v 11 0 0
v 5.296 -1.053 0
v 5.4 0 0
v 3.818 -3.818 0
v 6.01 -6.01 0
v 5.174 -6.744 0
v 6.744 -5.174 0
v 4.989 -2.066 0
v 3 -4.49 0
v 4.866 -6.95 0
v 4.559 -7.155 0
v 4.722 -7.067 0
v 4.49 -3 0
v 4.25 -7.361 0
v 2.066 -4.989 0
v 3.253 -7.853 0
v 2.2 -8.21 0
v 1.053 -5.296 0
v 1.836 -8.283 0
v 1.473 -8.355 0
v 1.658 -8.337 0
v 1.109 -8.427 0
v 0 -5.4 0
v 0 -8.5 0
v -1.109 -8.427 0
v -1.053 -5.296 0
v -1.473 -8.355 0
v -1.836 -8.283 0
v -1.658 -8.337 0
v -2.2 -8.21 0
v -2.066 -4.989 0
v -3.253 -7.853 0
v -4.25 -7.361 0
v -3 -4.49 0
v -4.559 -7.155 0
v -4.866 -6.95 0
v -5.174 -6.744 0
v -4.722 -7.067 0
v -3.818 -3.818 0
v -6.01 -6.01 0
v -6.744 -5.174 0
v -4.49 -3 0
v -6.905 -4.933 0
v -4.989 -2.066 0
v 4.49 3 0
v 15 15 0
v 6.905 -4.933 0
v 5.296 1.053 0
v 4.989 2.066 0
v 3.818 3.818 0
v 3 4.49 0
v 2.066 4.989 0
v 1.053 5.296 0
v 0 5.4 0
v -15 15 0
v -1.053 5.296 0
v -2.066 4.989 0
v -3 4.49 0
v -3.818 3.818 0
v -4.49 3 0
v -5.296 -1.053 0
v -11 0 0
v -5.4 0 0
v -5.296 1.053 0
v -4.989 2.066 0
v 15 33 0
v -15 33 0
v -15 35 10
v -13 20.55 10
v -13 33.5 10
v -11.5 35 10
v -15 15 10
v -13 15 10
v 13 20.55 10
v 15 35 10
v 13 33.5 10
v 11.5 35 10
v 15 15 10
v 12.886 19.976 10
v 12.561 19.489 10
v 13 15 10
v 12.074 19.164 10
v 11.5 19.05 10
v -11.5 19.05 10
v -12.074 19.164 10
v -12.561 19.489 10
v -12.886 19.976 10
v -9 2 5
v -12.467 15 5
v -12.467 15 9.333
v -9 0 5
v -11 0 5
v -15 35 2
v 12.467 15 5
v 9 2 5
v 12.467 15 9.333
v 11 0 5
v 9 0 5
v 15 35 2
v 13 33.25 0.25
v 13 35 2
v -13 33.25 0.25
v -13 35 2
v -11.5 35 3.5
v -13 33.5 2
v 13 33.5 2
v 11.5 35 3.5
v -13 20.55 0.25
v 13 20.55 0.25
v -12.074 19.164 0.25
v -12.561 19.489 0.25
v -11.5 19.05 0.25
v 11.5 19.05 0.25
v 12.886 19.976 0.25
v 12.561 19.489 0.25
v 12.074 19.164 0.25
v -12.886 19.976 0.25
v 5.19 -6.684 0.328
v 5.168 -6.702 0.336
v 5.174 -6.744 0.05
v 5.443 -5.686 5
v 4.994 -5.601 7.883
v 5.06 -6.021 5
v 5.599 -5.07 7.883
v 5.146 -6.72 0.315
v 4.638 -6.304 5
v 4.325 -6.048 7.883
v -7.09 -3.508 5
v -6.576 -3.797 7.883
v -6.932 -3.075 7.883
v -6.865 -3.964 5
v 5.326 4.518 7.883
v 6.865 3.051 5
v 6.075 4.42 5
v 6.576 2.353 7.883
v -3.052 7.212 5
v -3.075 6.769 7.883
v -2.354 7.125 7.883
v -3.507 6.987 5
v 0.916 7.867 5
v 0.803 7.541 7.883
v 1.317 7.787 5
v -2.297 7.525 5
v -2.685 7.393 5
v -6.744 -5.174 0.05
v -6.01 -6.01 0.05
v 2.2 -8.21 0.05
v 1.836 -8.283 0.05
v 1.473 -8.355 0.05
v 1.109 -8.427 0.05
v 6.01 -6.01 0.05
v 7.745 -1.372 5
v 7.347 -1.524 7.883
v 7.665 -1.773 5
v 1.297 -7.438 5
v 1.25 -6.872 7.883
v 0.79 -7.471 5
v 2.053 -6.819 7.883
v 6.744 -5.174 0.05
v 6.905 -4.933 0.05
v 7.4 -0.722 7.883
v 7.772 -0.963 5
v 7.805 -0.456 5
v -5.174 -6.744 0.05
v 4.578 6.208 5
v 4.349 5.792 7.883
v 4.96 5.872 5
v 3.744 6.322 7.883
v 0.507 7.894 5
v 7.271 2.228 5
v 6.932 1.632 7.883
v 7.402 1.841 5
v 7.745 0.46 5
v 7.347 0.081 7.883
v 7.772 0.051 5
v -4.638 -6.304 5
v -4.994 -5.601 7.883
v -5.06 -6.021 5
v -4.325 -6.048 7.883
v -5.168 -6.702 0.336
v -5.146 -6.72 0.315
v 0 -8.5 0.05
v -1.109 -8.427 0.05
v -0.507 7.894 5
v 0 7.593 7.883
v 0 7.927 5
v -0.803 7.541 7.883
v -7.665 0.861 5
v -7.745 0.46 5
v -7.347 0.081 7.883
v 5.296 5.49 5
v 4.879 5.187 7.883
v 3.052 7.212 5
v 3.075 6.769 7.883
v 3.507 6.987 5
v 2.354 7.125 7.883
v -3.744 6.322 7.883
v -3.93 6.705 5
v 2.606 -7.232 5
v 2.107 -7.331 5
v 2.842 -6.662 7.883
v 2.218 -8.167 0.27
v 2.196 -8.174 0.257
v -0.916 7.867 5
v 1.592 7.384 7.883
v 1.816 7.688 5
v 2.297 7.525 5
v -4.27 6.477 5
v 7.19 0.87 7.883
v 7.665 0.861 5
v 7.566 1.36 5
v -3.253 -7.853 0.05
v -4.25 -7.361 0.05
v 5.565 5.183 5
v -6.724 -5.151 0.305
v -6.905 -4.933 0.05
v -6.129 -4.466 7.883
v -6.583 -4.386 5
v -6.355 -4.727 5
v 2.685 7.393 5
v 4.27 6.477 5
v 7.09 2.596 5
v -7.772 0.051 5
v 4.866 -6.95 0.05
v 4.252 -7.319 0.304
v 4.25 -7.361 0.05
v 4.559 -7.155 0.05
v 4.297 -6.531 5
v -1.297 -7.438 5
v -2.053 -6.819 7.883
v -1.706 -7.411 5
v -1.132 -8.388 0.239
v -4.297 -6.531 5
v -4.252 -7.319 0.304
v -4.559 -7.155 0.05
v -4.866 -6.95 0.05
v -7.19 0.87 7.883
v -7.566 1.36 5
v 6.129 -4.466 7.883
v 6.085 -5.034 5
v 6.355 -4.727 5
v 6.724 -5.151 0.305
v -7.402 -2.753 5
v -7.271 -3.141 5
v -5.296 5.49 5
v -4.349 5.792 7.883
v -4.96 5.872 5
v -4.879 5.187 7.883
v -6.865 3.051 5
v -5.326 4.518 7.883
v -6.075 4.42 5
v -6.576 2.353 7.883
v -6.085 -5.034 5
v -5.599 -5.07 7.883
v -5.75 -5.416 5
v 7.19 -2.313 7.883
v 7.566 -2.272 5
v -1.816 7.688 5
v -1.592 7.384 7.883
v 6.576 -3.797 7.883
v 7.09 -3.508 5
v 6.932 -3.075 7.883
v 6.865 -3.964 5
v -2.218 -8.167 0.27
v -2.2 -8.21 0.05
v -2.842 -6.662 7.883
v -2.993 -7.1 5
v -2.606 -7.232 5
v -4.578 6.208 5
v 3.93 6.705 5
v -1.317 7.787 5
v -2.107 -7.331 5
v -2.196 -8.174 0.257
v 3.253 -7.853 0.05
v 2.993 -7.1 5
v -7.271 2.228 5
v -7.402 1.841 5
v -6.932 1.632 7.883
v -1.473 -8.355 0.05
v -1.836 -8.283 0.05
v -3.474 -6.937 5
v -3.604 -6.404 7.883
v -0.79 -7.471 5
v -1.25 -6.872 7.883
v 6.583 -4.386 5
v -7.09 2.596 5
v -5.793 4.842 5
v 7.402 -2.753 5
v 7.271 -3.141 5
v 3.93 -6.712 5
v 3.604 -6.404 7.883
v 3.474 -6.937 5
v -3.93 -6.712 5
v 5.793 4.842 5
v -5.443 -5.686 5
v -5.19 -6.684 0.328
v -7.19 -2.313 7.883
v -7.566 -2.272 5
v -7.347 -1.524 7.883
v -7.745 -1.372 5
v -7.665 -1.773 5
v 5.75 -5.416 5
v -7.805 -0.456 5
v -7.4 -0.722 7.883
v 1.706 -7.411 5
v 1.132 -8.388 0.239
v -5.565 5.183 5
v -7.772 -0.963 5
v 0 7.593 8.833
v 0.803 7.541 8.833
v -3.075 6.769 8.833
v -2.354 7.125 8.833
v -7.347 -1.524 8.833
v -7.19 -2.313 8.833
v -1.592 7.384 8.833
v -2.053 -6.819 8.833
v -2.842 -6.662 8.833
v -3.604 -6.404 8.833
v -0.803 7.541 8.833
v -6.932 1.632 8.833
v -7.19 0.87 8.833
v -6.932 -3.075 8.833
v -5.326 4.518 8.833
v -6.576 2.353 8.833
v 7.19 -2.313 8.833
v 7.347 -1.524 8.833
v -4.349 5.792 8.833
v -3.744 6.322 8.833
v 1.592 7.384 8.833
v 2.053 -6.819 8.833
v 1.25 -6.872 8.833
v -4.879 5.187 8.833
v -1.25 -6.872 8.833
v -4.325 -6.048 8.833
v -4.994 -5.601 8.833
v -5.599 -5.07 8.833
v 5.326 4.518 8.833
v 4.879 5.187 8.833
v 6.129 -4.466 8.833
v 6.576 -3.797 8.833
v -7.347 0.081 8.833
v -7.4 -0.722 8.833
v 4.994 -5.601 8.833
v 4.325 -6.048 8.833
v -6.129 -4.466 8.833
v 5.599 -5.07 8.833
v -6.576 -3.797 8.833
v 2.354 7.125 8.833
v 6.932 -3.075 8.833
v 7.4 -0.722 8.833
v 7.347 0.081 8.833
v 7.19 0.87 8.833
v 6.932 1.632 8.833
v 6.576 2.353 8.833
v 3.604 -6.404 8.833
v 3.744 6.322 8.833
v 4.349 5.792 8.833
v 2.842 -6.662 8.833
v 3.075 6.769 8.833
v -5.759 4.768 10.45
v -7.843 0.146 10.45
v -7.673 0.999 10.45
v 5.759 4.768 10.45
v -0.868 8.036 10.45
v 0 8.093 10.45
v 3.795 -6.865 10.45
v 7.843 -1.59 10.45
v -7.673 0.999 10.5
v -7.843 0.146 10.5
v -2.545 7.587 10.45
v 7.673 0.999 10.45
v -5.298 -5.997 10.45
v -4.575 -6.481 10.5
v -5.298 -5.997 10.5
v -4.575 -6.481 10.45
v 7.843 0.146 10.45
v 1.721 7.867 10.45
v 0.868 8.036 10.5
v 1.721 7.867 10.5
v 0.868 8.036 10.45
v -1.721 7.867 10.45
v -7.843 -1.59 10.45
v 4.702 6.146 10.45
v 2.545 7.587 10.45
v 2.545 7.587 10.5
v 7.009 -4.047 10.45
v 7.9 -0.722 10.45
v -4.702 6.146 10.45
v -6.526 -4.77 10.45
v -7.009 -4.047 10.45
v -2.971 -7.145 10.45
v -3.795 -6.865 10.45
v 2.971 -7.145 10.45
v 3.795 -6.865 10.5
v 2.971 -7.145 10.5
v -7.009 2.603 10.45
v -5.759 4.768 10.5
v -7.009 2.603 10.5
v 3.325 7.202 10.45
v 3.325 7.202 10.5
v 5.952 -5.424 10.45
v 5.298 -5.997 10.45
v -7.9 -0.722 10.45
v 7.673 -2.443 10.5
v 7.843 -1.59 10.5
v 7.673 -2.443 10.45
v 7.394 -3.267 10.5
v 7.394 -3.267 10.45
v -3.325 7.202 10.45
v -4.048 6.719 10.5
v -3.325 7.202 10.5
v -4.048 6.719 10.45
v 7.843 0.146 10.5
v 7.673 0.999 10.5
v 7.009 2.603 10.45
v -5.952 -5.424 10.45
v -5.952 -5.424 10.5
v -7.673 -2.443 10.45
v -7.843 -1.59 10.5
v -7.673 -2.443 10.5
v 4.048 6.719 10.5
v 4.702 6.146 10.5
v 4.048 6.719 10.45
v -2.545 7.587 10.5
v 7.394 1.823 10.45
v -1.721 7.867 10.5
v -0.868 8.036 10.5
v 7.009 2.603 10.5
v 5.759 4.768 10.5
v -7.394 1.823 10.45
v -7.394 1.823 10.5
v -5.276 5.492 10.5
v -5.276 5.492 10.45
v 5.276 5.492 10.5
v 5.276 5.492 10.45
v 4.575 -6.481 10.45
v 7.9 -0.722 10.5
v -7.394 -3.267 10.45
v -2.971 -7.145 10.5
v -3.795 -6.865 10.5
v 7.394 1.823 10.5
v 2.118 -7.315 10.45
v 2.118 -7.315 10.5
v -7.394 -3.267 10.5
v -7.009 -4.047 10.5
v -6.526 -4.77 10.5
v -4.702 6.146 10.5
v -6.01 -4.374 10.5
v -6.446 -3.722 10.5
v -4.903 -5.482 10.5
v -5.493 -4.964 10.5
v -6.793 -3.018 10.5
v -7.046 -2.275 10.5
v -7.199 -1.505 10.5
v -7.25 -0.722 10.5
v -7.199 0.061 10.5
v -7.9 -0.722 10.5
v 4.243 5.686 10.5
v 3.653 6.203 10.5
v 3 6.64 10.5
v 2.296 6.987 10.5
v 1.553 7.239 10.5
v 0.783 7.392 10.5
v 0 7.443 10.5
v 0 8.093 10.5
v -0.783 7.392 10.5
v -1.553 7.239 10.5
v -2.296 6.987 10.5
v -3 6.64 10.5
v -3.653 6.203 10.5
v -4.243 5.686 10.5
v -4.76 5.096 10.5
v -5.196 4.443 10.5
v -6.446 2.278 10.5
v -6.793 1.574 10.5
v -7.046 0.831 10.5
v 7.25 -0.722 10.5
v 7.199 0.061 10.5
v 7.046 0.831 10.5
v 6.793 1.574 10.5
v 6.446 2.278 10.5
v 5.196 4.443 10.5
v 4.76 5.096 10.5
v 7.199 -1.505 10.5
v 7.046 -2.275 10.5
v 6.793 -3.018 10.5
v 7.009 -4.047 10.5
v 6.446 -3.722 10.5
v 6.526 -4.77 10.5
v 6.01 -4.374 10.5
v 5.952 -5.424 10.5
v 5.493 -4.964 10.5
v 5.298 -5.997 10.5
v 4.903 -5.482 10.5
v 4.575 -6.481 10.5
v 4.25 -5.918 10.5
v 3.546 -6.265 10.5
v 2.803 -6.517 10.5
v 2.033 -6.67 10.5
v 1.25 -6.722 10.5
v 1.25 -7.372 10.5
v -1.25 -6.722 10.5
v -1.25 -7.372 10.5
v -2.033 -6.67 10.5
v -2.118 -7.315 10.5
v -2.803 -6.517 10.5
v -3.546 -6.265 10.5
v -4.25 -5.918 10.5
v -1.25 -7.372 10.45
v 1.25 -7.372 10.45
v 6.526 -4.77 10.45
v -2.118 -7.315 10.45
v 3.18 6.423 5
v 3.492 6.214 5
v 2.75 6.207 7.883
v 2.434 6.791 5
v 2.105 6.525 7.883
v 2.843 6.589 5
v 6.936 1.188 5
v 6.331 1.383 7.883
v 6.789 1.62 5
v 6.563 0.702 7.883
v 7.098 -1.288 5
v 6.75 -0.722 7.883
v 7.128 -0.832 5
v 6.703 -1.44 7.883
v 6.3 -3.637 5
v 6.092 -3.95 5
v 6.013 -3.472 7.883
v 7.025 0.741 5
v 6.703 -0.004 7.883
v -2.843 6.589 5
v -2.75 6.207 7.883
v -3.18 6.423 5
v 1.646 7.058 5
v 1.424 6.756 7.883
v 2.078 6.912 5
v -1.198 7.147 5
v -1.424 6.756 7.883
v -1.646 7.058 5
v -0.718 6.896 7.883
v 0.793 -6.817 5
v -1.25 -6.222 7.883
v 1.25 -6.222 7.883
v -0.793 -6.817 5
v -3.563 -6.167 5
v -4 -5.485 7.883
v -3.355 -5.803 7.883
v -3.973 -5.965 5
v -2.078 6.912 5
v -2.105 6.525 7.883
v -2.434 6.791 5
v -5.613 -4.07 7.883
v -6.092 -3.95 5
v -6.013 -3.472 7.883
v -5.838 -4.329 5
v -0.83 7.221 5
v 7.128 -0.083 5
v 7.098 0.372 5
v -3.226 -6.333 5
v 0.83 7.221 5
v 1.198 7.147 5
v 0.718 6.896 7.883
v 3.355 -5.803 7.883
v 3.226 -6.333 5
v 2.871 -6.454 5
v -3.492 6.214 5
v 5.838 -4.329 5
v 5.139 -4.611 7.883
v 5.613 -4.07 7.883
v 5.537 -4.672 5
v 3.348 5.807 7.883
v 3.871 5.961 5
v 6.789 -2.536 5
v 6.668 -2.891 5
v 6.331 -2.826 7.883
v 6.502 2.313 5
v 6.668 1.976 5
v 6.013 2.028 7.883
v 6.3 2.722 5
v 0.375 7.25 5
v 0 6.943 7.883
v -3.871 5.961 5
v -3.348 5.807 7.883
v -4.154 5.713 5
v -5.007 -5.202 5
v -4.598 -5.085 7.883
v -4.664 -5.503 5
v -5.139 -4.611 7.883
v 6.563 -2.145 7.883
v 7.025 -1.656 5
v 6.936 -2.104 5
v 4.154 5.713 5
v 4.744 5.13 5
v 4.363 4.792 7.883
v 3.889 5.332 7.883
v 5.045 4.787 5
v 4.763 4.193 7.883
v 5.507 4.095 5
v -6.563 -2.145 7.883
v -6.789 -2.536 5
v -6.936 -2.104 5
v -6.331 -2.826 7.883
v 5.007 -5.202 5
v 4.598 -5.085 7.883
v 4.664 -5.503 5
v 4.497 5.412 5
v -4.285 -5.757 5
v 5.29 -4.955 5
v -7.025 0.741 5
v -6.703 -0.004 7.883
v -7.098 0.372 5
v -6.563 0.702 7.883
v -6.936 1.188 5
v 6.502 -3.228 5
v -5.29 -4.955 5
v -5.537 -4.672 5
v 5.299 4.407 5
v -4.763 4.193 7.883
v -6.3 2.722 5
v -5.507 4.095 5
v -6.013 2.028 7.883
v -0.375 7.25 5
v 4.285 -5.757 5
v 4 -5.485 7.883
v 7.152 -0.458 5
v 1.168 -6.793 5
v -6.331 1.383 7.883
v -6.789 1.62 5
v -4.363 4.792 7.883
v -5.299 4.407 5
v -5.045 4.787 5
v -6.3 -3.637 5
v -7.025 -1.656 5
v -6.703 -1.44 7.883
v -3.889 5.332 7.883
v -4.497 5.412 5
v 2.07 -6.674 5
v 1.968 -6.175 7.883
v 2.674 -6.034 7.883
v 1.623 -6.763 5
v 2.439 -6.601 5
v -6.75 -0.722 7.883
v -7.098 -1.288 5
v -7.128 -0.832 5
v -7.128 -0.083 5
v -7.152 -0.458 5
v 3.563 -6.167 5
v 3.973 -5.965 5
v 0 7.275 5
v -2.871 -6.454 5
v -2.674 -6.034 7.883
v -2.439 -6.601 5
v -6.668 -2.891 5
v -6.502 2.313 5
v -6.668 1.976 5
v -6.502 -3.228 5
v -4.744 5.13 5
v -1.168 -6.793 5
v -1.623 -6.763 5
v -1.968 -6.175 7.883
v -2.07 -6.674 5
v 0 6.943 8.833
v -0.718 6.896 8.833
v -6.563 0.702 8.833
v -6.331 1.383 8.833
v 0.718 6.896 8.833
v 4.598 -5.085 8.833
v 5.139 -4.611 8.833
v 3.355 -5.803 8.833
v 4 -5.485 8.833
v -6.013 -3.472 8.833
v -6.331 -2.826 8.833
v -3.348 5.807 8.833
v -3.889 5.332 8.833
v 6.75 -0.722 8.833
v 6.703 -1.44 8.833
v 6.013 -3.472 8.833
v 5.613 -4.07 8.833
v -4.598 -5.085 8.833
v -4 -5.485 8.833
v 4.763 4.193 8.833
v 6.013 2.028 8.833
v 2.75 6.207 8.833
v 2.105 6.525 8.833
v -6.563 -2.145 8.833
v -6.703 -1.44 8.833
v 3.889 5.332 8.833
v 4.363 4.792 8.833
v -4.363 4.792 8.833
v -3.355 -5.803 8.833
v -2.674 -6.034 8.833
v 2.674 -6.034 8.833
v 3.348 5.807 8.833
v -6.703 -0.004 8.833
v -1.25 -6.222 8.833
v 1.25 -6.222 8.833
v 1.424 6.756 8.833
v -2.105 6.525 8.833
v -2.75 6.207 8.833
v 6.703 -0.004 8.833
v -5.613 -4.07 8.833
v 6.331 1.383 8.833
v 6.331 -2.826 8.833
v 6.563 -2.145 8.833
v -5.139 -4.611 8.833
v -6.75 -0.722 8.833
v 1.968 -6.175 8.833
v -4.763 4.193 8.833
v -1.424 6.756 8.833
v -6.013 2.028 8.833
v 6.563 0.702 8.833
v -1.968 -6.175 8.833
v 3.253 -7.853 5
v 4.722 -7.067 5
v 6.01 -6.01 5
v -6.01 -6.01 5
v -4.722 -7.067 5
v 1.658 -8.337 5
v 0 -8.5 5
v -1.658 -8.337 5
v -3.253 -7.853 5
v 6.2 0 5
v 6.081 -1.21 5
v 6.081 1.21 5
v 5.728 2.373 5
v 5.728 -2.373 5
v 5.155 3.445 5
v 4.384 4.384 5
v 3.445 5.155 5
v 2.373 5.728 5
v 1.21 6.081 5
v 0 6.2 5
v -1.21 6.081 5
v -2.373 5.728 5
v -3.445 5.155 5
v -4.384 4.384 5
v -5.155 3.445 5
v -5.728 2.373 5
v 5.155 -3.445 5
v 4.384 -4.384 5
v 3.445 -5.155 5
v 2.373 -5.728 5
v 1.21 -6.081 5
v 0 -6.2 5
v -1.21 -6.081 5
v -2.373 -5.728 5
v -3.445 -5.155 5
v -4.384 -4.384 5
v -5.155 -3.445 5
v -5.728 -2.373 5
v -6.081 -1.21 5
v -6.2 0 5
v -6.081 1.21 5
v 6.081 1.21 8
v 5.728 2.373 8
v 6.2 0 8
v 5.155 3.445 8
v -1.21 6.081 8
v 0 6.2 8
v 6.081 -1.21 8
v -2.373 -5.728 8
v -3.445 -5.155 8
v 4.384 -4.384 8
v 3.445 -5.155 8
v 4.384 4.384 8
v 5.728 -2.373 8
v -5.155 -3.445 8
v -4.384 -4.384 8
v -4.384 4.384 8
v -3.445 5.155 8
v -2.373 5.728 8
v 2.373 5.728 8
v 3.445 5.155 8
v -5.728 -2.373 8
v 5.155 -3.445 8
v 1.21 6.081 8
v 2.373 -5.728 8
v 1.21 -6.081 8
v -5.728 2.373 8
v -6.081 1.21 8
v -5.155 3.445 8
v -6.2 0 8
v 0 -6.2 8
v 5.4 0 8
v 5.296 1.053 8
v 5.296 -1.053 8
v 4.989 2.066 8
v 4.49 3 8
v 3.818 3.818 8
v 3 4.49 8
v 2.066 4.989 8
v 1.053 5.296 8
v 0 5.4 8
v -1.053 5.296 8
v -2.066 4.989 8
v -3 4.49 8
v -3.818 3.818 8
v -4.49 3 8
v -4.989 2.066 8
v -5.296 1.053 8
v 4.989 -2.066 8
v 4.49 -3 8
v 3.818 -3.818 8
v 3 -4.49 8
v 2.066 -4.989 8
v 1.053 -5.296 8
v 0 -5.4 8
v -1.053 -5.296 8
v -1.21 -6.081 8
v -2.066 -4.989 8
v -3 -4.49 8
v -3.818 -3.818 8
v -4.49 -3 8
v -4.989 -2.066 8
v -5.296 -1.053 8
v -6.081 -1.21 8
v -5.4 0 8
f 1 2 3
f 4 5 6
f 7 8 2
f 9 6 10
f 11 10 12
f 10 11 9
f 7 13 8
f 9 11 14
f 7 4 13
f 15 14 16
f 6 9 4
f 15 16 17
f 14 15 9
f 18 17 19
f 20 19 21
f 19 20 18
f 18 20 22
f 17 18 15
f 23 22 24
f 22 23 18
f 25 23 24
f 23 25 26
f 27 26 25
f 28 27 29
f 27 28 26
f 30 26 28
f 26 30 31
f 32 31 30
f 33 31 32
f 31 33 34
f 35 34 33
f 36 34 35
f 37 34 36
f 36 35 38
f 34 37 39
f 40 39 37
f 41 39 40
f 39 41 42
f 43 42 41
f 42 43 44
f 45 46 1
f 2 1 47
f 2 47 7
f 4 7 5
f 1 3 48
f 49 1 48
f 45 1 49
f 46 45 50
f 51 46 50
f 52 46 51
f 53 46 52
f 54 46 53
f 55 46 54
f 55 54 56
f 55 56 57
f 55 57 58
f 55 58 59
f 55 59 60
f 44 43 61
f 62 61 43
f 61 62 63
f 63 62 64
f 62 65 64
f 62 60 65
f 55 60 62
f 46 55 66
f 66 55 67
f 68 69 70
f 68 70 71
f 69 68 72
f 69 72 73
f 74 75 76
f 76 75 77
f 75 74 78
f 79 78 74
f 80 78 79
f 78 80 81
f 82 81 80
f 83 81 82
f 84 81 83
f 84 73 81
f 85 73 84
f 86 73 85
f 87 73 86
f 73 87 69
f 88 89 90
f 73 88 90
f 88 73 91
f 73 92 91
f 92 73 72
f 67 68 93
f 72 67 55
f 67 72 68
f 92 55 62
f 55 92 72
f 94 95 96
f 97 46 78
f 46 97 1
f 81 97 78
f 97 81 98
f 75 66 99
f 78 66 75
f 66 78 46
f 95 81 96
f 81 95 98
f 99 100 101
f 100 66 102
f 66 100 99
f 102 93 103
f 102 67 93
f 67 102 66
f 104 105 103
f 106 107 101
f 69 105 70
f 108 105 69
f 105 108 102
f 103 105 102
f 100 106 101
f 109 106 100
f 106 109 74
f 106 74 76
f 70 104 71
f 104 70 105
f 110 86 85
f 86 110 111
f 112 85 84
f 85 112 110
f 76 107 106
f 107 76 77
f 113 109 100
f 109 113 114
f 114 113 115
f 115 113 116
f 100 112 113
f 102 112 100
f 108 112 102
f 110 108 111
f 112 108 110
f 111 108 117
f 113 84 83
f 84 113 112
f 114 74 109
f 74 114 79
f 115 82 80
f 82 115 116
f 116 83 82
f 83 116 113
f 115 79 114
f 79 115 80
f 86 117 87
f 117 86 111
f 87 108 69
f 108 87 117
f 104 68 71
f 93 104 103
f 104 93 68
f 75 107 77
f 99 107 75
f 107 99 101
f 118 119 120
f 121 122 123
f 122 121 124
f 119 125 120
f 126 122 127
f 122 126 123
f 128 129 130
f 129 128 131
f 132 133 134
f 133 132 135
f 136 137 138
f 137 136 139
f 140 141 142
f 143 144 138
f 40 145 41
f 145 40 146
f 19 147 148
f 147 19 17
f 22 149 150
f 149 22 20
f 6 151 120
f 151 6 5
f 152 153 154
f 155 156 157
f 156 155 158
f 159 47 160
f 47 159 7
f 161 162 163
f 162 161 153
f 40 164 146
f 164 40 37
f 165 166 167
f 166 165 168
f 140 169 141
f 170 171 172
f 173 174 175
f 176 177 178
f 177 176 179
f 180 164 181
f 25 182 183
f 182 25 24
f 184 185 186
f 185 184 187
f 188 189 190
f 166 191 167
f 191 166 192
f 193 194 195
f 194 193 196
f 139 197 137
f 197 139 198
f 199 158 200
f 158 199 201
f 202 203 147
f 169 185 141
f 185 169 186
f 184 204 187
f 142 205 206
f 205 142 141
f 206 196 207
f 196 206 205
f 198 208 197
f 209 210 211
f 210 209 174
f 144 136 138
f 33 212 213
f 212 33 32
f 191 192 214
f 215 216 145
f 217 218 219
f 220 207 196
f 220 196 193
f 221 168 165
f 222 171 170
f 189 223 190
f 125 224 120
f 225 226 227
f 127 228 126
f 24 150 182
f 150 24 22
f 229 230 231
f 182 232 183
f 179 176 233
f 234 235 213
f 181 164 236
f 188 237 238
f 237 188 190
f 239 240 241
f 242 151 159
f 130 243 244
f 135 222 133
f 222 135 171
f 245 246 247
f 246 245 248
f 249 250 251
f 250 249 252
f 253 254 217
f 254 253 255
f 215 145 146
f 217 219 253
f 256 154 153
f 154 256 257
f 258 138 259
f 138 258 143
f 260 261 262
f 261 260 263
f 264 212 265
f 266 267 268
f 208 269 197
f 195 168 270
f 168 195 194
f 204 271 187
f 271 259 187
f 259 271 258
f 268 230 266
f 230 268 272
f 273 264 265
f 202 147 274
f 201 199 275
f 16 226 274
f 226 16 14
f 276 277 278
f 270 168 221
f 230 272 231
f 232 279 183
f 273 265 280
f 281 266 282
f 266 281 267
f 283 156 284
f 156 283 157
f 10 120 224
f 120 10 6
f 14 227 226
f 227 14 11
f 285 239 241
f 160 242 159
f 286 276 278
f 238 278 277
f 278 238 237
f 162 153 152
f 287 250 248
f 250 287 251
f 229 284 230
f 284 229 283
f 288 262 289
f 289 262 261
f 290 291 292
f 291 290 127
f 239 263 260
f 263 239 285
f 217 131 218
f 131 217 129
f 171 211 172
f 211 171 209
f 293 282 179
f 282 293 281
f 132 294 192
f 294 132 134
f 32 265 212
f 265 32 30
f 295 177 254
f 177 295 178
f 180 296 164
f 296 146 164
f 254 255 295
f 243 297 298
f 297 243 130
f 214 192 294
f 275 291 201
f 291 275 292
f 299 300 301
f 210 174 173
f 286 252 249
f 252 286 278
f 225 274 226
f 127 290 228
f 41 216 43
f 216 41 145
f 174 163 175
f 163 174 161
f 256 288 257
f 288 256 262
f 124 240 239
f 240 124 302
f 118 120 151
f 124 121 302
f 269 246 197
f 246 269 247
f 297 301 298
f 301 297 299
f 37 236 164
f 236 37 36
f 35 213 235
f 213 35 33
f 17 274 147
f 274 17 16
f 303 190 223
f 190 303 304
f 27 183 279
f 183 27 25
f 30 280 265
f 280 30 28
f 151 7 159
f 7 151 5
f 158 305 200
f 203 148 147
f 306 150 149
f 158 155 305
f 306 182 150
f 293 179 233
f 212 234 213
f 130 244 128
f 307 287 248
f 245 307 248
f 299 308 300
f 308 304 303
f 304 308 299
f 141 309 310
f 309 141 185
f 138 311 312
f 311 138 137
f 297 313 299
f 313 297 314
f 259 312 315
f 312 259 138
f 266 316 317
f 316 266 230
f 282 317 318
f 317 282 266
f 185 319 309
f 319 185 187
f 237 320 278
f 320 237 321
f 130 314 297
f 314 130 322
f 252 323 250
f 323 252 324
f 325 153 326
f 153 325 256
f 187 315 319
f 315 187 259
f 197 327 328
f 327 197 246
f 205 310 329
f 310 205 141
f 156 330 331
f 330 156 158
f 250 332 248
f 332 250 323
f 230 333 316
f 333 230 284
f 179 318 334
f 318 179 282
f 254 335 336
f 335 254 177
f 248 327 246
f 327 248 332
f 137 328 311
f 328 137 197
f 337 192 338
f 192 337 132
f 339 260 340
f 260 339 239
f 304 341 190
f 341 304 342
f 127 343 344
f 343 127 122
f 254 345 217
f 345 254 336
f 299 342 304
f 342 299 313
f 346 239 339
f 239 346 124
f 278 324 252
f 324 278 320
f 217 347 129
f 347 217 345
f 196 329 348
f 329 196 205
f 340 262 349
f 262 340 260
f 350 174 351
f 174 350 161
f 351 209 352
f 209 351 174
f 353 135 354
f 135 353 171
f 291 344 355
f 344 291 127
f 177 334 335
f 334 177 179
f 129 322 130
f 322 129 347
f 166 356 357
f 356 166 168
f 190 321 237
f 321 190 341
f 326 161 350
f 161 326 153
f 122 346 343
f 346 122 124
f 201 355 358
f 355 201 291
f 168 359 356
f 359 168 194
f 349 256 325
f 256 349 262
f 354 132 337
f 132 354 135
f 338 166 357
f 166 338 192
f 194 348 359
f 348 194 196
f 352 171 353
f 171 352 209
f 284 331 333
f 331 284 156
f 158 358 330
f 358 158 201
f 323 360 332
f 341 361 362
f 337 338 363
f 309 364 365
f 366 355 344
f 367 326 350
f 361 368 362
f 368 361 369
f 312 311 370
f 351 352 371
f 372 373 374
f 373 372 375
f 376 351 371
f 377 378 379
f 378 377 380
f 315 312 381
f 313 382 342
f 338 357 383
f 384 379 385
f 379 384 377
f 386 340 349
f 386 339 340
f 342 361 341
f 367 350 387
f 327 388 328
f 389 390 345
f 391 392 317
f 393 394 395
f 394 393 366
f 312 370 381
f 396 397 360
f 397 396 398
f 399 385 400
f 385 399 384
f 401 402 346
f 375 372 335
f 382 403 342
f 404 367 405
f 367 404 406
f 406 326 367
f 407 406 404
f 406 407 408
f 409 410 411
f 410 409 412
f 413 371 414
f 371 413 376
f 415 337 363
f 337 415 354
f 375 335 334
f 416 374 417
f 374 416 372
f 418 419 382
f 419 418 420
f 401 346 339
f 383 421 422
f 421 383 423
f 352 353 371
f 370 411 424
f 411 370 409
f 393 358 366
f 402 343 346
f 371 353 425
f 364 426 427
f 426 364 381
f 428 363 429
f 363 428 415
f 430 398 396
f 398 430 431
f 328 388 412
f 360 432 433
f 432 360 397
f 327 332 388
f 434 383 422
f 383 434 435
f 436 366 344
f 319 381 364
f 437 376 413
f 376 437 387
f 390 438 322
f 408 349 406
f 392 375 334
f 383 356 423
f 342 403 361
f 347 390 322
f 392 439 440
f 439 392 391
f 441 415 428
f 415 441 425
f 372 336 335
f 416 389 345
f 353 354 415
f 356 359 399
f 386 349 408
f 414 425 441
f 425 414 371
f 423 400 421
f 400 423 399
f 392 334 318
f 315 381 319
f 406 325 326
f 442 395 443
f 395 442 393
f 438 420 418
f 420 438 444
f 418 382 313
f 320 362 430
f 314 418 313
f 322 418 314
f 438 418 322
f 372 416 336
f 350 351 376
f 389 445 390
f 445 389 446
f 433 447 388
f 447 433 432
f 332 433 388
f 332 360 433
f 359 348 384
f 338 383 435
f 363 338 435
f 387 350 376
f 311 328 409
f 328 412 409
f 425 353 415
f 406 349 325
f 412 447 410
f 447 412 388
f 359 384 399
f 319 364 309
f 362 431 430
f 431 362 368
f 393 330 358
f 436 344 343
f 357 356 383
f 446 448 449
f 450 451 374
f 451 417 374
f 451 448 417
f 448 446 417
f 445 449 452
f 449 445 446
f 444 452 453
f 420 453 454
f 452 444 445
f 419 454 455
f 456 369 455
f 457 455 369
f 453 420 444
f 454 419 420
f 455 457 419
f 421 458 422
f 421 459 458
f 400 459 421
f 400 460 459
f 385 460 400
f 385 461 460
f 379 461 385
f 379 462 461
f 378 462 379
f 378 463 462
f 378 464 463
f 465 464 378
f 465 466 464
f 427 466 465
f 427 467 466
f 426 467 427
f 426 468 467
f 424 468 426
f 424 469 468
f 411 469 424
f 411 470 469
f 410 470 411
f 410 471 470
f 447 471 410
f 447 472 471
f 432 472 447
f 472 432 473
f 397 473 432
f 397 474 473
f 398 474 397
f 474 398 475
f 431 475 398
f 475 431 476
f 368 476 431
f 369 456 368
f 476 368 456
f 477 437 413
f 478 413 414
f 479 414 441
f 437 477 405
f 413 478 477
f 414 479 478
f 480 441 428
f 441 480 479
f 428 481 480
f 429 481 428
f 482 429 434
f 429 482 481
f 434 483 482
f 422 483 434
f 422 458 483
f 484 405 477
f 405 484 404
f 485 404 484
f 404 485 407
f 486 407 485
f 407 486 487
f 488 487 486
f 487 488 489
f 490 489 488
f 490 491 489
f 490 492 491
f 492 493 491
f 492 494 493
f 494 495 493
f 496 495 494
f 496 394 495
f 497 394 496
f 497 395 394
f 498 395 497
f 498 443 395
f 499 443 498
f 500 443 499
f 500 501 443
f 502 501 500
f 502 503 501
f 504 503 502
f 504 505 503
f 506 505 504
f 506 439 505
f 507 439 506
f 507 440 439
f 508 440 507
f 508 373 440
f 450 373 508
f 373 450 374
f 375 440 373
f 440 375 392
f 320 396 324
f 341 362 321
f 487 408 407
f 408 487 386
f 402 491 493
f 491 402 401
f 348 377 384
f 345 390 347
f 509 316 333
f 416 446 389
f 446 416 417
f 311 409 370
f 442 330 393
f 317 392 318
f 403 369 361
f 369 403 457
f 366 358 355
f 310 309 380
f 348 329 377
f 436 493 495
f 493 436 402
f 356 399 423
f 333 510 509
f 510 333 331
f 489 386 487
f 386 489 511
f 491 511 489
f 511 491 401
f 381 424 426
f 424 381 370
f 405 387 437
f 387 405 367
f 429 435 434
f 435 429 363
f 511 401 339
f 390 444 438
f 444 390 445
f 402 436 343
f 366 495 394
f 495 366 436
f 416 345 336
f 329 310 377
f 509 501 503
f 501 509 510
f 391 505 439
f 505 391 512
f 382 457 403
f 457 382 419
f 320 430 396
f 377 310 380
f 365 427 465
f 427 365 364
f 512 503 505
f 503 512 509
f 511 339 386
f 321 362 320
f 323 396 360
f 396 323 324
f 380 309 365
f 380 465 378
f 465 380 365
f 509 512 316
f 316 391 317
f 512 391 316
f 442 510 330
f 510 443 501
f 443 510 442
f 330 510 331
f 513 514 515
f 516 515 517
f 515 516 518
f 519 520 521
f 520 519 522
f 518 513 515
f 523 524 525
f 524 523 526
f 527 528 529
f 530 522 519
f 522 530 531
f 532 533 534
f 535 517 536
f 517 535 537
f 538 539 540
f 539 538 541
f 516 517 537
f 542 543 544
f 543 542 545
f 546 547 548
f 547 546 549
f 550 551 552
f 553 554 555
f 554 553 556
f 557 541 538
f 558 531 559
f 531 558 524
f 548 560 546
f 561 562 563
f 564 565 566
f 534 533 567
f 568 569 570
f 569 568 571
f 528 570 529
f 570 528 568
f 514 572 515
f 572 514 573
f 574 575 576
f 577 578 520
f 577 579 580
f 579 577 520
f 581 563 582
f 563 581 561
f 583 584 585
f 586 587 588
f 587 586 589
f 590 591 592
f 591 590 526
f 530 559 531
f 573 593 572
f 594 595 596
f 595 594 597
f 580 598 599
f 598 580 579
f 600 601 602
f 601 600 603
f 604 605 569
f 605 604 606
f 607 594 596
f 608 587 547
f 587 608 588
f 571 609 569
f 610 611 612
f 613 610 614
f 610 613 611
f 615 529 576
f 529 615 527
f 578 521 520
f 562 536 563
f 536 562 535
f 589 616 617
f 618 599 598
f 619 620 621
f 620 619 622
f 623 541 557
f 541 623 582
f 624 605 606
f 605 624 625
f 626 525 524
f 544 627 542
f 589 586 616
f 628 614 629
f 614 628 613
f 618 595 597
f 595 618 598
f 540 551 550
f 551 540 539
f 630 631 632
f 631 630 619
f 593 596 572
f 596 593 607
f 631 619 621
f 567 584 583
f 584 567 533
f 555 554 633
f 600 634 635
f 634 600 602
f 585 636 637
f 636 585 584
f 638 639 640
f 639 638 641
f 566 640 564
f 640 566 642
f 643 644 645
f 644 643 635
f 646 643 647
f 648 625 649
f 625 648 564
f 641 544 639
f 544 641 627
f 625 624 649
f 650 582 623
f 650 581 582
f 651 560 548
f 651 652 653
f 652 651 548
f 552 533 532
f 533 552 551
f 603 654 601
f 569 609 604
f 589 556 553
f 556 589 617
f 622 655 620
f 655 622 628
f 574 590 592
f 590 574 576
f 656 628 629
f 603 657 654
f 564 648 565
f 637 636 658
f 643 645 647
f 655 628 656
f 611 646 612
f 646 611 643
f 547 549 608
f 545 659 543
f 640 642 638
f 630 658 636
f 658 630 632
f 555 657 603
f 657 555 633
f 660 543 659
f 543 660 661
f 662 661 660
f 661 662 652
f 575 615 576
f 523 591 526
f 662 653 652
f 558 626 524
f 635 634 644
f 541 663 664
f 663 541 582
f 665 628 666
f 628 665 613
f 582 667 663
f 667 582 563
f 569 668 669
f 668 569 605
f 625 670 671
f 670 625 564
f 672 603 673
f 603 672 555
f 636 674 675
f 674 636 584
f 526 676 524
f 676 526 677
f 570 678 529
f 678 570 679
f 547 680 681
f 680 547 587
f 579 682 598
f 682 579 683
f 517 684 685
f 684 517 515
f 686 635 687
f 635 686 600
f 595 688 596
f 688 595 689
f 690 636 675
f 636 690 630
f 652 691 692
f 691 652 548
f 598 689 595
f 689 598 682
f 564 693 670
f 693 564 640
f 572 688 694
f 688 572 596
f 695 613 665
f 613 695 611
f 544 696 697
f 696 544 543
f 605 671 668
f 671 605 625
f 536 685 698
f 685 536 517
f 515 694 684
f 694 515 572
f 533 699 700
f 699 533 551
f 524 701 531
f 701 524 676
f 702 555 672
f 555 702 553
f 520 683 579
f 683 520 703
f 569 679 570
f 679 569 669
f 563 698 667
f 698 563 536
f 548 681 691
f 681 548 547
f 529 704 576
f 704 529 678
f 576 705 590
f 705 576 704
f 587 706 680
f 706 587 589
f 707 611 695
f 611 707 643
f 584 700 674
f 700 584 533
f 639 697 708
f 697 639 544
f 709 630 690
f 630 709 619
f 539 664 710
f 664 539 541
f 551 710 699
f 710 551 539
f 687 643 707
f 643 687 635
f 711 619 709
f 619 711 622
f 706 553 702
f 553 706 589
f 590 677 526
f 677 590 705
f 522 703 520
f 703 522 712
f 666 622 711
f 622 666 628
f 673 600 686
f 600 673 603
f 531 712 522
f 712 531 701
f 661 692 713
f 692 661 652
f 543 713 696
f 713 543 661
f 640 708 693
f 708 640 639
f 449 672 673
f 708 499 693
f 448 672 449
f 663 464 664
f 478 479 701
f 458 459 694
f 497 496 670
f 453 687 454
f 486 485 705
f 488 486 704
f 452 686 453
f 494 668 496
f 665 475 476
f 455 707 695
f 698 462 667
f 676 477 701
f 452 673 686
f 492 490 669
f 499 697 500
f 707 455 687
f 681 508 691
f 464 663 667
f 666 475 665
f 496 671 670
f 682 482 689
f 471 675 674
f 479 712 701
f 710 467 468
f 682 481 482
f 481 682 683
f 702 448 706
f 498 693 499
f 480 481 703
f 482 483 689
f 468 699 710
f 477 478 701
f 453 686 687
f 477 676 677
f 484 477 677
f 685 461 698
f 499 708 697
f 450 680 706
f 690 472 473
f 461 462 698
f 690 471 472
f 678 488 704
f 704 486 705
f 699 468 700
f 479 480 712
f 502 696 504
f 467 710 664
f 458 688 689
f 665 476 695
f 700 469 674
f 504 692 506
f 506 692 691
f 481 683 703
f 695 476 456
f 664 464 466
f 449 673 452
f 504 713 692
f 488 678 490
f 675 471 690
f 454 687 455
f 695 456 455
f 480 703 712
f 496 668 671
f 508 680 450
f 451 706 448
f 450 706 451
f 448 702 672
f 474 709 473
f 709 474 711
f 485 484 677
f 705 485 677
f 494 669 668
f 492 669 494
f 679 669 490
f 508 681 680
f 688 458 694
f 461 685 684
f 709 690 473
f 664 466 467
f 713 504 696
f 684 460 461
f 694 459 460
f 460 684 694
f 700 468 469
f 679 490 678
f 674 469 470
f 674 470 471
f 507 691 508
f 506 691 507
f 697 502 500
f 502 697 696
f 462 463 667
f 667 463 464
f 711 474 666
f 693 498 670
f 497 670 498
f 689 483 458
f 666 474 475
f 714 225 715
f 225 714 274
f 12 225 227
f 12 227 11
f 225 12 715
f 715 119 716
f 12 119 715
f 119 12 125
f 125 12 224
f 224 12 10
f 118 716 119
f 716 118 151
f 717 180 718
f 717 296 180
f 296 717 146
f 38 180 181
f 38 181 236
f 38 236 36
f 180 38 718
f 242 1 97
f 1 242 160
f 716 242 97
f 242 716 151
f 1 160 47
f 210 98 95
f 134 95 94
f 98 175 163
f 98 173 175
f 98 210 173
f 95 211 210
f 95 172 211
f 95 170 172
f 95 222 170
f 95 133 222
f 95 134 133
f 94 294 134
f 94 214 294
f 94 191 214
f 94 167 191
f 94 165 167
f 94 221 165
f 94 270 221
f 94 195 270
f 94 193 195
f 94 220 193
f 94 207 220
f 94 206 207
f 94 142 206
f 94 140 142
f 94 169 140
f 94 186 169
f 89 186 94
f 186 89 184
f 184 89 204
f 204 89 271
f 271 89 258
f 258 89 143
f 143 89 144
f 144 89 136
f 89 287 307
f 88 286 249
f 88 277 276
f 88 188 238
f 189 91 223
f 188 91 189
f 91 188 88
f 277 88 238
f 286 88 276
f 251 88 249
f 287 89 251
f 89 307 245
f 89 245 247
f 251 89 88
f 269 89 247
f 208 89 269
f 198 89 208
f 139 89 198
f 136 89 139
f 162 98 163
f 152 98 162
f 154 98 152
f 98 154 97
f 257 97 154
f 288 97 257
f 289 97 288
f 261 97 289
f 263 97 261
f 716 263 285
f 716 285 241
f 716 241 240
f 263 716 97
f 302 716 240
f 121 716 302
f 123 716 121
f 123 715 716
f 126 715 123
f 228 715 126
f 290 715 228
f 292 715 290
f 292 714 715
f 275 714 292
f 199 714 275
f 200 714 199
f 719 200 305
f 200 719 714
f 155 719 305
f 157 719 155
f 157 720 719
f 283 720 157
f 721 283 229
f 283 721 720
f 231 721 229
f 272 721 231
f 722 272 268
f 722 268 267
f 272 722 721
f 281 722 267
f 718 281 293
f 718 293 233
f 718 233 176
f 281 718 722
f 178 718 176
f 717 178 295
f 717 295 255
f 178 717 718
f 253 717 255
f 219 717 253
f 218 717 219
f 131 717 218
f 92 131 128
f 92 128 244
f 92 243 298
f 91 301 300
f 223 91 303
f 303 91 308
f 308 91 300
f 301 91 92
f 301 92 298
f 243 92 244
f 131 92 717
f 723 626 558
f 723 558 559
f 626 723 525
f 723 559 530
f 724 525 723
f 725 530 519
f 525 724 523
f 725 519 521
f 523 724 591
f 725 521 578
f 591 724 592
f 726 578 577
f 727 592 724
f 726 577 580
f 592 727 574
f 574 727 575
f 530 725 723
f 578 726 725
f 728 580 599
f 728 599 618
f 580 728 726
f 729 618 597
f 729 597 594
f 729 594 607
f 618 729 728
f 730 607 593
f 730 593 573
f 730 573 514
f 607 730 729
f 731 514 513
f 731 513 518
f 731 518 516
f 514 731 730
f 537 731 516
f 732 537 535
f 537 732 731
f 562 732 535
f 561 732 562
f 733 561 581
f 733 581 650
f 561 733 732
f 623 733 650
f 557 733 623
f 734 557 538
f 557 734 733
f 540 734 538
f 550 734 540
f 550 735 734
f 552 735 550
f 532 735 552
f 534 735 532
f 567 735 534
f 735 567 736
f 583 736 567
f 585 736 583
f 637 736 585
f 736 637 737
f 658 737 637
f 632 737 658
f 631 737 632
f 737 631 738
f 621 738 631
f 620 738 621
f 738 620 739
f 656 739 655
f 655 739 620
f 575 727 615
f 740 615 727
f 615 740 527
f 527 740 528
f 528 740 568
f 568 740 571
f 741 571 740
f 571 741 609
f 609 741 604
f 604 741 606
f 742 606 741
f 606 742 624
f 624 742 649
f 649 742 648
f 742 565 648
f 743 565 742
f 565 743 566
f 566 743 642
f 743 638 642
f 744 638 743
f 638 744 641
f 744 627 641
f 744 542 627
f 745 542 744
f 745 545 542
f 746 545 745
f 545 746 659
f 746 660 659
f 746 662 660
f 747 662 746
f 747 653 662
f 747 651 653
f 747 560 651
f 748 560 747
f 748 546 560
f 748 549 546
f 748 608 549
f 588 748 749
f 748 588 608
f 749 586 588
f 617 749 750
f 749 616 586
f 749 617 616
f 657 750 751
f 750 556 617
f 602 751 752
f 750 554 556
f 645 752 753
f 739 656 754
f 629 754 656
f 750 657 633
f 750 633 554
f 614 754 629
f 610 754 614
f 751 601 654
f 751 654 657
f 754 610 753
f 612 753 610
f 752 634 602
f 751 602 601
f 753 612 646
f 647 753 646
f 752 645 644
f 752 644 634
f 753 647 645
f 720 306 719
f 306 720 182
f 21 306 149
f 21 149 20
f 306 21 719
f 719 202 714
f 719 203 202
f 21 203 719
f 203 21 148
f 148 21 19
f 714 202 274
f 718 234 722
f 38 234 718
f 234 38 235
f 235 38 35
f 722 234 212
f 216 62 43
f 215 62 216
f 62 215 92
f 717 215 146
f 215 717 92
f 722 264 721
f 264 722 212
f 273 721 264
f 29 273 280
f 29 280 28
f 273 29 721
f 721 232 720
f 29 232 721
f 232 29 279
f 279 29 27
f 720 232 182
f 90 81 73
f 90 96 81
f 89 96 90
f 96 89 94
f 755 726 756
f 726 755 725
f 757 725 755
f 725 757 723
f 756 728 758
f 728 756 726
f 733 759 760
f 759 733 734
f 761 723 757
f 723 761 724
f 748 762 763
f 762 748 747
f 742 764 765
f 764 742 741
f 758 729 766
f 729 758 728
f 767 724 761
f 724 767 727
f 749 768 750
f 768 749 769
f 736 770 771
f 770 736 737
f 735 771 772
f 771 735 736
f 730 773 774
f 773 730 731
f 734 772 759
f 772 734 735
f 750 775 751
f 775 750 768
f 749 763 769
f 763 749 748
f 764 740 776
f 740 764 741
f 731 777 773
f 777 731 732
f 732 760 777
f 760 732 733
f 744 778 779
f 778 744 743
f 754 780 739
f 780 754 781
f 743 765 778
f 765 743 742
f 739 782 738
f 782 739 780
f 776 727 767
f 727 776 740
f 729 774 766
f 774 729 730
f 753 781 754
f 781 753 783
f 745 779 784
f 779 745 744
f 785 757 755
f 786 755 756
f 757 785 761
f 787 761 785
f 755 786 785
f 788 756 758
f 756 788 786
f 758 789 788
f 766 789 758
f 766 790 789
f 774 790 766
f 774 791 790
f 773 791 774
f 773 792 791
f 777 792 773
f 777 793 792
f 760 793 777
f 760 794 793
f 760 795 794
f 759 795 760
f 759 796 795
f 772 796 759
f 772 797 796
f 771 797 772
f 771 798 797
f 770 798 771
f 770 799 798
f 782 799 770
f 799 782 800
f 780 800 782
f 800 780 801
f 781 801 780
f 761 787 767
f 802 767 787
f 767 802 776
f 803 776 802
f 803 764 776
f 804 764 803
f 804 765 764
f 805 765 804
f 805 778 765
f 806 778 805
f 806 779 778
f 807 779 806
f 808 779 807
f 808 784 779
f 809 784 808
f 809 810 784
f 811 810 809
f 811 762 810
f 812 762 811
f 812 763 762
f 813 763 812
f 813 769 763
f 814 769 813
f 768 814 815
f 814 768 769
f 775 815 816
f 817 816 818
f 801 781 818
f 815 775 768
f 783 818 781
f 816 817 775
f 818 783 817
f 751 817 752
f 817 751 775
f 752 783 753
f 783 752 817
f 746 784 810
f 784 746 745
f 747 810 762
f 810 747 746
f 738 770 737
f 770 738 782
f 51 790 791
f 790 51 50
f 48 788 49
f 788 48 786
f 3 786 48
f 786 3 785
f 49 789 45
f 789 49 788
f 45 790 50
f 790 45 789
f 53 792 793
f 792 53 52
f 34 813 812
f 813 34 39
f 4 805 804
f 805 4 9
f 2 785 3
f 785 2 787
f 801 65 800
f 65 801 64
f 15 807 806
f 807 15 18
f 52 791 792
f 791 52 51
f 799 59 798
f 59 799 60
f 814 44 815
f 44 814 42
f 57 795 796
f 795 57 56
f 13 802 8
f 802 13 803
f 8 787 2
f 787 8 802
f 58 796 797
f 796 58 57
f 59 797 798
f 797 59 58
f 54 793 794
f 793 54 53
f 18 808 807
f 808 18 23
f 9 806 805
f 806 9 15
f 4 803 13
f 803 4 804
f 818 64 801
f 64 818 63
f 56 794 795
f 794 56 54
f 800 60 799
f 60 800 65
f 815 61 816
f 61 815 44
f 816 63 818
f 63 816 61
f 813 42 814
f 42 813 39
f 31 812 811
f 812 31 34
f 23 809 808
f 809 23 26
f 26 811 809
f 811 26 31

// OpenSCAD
// file: microscope_parameters.scad
/******************************************************************
*                                                                 *
* OpenFlexure Microscope: Microscope Parameters                   *
*                                                                 *
* This is the top-level configuration file for the OpenFlexure    *
* microscope, an open microscope and 3-axis translation stage.    *
* It gets really good precision over a ~10mm range, by using      *
* plastic flexure mechanisms.                                     *
*                                                                 *
* Generally I've tried to put parts (or collections of closely    *
* related parts) in their own files.  However, all the parts      *
* depend on the geometry of the microscope - so these parameters  *
* are gathered together here.  In general, the ones you might     *
* to change are towards the top!  Lower-down ones are defined in  *
* terms of higher-up ones - confusion might arise if you redefine *
* these later...                                                  *
*                                                                 *
* (c) Richard Bowman, January 2016                                *
* Released under the CERN Open Hardware License                   *
*                                                                 *
* http://www.github.com/rwb27/openflexure_microscope              *
* http://www.docubricks.com/projects/openflexure-microscope       *
* http://www.waterscope.org                                       *
*                                                                 *
******************************************************************/

d = 0.05;
$fn=32;

// These are the most useful parameters to change!
big_stage = true; //this option is obsolete and must now always be true...
motor_lugs = true;
version_numstring = "6.1.2";
camera = "picamera_2"; //see cameras/camera.scad for valid values
optics = "rms_f50d13"; //see optics.scad for valid values
led_r = 4.5/2; //size of the LED used for illumination
endstops = false; //whether to build mounts for optical endstops inside the microscope.
feet_endstops = false; //whether to include cut-outs for endstop switches in the feet. 
beamsplitter = false; //enables a cut-out in some optics modules for a beamsplitter
smart_brim_r = 5;
enable_smart_brim = false;

// This sets the basic geometry of the microscope
sample_z = big_stage?65:40; // height of the top of the stage
leg_r = big_stage?30:25; // radius of innermost part of legs (stage size)
hole_r = big_stage?20:10; // size of hole in the stage
xy_lever_ratio = big_stage?4.0/7.0:1.0; // mechanical advantage of actuator over stage - can be used to trade speed and precision
z_lever_ratio = 1.0; // as above, for Z axis (must be >1)
// The variables below affect the position of the objective mount
z_strut_l = big_stage?18:15; //length of struts supporting Z carriage
objective_mount_y = big_stage?18:12; // y position of clip for optics
objective_mount_nose_w = 6; // width of the pointy end of the mount
condenser_clip_w = 14; // width of the dovetail clip for the condenser
foot_height=feet_endstops?15:15; //the endstops need a bit of extra height (or not)

// These variables set the dimensions of flexures
// You might want to tweak them if your material (or printer)
// is different from the ones I've tested, though ABS/PLA extrusion
// is generally fine with my parameters
stage_flex_w = 4; // width of XY axis flexures
zflex_l = 1.5;    // length of (all) flexible bits
zflex_t = 0.75;   // thickness of (all) flexible bits
zflex = [stage_flex_w, zflex_l, zflex_t]; // the above in new-style format
flex_a = 0.15;    // sine of the angle through which flexures can be bent

// Compile a sensible version string
version_string = str("v",version_numstring, big_stage?"-LS":"-SS", sample_z, motor_lugs?"-M":"");
echo(str("Compiling OpenFlexure Microscope ",version_string));

stage_t=5; //thickness of the XY stage (at thickest point, most is 1mm less)
flex_z1 = 0;      // z position of lower flexures for XY axis
flex_z2 = sample_z-stage_t; //height of upper XY flexures
z_strut_t = 6;  // (z) thickness of struts for Z axis
z_flex_w = 4;   // width of struts for Z axis
leg = [4,stage_flex_w,flex_z2+zflex_t]; // size of vertical legs
leg_middle_w = 12; // width of the middle part of each leg
actuator_h = 25; //height of the actuator columns
dz = 0.5; //small increment in Z (~ 2 layers)

leg_outer_w = leg_middle_w + 2*zflex_l + 2*leg[0]; // overall width of parallelogram legs that support the stagef
actuator = [3*1.2+2*2,(flex_z2 - flex_z1)*xy_lever_ratio,6]; // dimensions of the core part of the actuating levers for X and Y - NB should match the column_base_r in compact_nut_seat.scad
actuating_nut_r = (flex_z2 - flex_z1)*xy_lever_ratio; // distance from leg_r to the actuating nut/screw for the XY axes
xy_actuator_travel = actuating_nut_r*0.15; // distance moved by XY axis actuators

// Z axis
z_flexures_z1 = 8; // height of the lower Z flexure
z_flexures_z2 = min(sample_z - 12, 35); // " upper "
objective_mount_back_y = objective_mount_y + 2; //back of objective mount
z_anchor_y = objective_mount_back_y + z_strut_l + 2*zflex[1]; // fixed end of the flexure-hinged lever that actuates the Z axis
z_anchor_w = 20; //width of the Z anchor
zll = (z_strut_l + zflex[1])*z_lever_ratio; //required actuator lever length
zfz = z_flexures_z1; // shorthand for the next line only!
z_nut_y = z_anchor_y - zflex[1]/2 + sqrt(zll*zll - zfz*zfz);
z_actuator_travel = zll*0.15; // distance moved by the Z actuator
z_actuator_tilt = -asin(z_flexures_z1/zll); //angle of the Z actuator

z_flexure_x = (leg_r-zflex_l-max(5,leg[2]*0.1))*sqrt(2); // x position of the outside of the Z-axis static anchors (either side of the XY stage, on the X axis) (no longer used by Z axis but still in use elsewhere.)

bridge_dz = 10; // spacing between thin links on legs
base_t=1; // thickness of the flat base of the structure
wall_h=15; // height of the stiffening vertical(ish) walls
wall_t=2; //thickness of the stiffening walls
zawall_h = z_flexures_z2 - 10; //height of wall near Z anchor
zbwall_h = z_flexures_z2 - 10; //height of bridge over Z lever
illumination_clip_y = (-(leg_r-zflex_l-wall_t/2+leg_outer_w/2)/sqrt(2)
                       -wall_t/2-1); //position of clip for
                      // illumination/back foot.  This is set to
                      // coincide with the wall between the back
                      // two legs. TODO: remove this
illumination_arm_screws = [[20,z_nut_y,sample_z-2],[-20,z_nut_y,sample_z-2], 
                           [0,(leg_r + leg_outer_w)/sqrt(2) + 4,sample_z-2]];
                      // positions of screws that mount the adjustable version of the 
                      // illumination arm
condenser_clip_y = -8; //position of dovetail for old condenser assembly TODO: rename this
base_mounting_holes = [[-20,z_nut_y-4,0],
                       [20,z_nut_y-4,0],
                       [-z_flexure_x-4,big_stage?-8:-4,0],
                       [z_flexure_x+4,big_stage?-8:-4,0]]; 
                       // holes to screw the microscope to a baseplate

endstop_extra_ringheight=feet_endstops?1:0;
endstop_hole_offset=0;
//this is a temporary option to printfeet with smaller travel
//without this with 15mm hole the stage hits the objective
//the stage can move ~3mm in each direction, so the actuator only moves
//~1.7 mm
avoid_objective_xyfoot_offset=xy_actuator_travel-1.8;

fl_cube_w = 16; //width of the fluorescence filter cube
// main file
/******************************************************************
*                                                                 *
* OpenFlexure Dissection Microscope: Microscope body              *
*                                                                 *
* This is the chassis of the OpenFlexure microscope, an open      *
* microscope and 3-axis translation stage.  It gets really good   *
* precision over a ~10mm range, by using plastic flexure          *
* mechanisms.                                                     *
*                                                                 *
* (c) Richard Bowman, January 2016                                *
* Released under the CERN Open Hardware License                   *
*                                                                 *
******************************************************************/

use <./utilities.scad>;
use <./dovetail.scad>;
use <./cameras/picamera_2.scad>;
include <./microscope_parameters.scad>;

front_dovetail_y = 35; // position of the main dovetail
front_dovetail_w = 30; // width of the main dovetail

camera_pcb = [25, 25];
wall_t = 2;
w = camera_pcb[0] + 1 + 4;
starty = -camera_pcb[1]/2-2.4; //edge of the PCB
base_h = 5; //thickness of the camera mount plate (lens pokes through this)
dt_clip = [front_dovetail_w, 16, 10]; //size of the dovetail clip
arm_end_y = front_dovetail_y-dt_clip[1]-4;

// parameters of the lens
pedestal_h = 3 + base_h;
lens_r = 13/2; // for flanged plastic condenser
//lens_r = 16/2; // for 16mm plastic condenser
aperture_r = lens_r-1.1;
lens_t = 1;
base_r = lens_r+2;

difference(){
    union(){
        // plate that the camera sits on
        hull(){
            cylinder(r=base_r, h=base_h, $fn=32);
            translate([-base_r-0.5-wall_t,0,0]) cube([2*(base_r+0.5+wall_t),wall_t,base_h]);
            translate([-dt_clip[0]/2, arm_end_y,0]) cube([dt_clip[0], wall_t, base_h]);
        }
        
        // walls either side for stiffness
        reflect([1,0,0]) sequential_hull(){
            translate([-base_r-0.5-wall_t,0,0])  cube([wall_t, wall_t, base_h]);
            translate([-dt_clip[0]/2, arm_end_y,0]) cube([wall_t, wall_t, dt_clip[2]]);
        }
        
        
        // mount for the dovetail clip
        translate([-dt_clip[0]/2,arm_end_y,0]) cube([dt_clip[0], 4, dt_clip[2]]);
        
        // the dovetail clip
        translate([0,front_dovetail_y, 0]) mirror([0,1,0]) dovetail_clip(dt_clip, slope_front=2, solid_bottom=0.2);
        
        // the lens holder
        trylinder_gripper(inner_r=lens_r, grip_h=pedestal_h + lens_t/3,h=pedestal_h+lens_t+1.5, base_r=base_r, flare=0.5);
        // pedestal to raise the lens up within the gripper
        cylinder(r=aperture_r+0.8,h=pedestal_h);
    }
    
    // hole for the beam passing through the lens
    cylinder(r=aperture_r,h=999,center=true);
}
